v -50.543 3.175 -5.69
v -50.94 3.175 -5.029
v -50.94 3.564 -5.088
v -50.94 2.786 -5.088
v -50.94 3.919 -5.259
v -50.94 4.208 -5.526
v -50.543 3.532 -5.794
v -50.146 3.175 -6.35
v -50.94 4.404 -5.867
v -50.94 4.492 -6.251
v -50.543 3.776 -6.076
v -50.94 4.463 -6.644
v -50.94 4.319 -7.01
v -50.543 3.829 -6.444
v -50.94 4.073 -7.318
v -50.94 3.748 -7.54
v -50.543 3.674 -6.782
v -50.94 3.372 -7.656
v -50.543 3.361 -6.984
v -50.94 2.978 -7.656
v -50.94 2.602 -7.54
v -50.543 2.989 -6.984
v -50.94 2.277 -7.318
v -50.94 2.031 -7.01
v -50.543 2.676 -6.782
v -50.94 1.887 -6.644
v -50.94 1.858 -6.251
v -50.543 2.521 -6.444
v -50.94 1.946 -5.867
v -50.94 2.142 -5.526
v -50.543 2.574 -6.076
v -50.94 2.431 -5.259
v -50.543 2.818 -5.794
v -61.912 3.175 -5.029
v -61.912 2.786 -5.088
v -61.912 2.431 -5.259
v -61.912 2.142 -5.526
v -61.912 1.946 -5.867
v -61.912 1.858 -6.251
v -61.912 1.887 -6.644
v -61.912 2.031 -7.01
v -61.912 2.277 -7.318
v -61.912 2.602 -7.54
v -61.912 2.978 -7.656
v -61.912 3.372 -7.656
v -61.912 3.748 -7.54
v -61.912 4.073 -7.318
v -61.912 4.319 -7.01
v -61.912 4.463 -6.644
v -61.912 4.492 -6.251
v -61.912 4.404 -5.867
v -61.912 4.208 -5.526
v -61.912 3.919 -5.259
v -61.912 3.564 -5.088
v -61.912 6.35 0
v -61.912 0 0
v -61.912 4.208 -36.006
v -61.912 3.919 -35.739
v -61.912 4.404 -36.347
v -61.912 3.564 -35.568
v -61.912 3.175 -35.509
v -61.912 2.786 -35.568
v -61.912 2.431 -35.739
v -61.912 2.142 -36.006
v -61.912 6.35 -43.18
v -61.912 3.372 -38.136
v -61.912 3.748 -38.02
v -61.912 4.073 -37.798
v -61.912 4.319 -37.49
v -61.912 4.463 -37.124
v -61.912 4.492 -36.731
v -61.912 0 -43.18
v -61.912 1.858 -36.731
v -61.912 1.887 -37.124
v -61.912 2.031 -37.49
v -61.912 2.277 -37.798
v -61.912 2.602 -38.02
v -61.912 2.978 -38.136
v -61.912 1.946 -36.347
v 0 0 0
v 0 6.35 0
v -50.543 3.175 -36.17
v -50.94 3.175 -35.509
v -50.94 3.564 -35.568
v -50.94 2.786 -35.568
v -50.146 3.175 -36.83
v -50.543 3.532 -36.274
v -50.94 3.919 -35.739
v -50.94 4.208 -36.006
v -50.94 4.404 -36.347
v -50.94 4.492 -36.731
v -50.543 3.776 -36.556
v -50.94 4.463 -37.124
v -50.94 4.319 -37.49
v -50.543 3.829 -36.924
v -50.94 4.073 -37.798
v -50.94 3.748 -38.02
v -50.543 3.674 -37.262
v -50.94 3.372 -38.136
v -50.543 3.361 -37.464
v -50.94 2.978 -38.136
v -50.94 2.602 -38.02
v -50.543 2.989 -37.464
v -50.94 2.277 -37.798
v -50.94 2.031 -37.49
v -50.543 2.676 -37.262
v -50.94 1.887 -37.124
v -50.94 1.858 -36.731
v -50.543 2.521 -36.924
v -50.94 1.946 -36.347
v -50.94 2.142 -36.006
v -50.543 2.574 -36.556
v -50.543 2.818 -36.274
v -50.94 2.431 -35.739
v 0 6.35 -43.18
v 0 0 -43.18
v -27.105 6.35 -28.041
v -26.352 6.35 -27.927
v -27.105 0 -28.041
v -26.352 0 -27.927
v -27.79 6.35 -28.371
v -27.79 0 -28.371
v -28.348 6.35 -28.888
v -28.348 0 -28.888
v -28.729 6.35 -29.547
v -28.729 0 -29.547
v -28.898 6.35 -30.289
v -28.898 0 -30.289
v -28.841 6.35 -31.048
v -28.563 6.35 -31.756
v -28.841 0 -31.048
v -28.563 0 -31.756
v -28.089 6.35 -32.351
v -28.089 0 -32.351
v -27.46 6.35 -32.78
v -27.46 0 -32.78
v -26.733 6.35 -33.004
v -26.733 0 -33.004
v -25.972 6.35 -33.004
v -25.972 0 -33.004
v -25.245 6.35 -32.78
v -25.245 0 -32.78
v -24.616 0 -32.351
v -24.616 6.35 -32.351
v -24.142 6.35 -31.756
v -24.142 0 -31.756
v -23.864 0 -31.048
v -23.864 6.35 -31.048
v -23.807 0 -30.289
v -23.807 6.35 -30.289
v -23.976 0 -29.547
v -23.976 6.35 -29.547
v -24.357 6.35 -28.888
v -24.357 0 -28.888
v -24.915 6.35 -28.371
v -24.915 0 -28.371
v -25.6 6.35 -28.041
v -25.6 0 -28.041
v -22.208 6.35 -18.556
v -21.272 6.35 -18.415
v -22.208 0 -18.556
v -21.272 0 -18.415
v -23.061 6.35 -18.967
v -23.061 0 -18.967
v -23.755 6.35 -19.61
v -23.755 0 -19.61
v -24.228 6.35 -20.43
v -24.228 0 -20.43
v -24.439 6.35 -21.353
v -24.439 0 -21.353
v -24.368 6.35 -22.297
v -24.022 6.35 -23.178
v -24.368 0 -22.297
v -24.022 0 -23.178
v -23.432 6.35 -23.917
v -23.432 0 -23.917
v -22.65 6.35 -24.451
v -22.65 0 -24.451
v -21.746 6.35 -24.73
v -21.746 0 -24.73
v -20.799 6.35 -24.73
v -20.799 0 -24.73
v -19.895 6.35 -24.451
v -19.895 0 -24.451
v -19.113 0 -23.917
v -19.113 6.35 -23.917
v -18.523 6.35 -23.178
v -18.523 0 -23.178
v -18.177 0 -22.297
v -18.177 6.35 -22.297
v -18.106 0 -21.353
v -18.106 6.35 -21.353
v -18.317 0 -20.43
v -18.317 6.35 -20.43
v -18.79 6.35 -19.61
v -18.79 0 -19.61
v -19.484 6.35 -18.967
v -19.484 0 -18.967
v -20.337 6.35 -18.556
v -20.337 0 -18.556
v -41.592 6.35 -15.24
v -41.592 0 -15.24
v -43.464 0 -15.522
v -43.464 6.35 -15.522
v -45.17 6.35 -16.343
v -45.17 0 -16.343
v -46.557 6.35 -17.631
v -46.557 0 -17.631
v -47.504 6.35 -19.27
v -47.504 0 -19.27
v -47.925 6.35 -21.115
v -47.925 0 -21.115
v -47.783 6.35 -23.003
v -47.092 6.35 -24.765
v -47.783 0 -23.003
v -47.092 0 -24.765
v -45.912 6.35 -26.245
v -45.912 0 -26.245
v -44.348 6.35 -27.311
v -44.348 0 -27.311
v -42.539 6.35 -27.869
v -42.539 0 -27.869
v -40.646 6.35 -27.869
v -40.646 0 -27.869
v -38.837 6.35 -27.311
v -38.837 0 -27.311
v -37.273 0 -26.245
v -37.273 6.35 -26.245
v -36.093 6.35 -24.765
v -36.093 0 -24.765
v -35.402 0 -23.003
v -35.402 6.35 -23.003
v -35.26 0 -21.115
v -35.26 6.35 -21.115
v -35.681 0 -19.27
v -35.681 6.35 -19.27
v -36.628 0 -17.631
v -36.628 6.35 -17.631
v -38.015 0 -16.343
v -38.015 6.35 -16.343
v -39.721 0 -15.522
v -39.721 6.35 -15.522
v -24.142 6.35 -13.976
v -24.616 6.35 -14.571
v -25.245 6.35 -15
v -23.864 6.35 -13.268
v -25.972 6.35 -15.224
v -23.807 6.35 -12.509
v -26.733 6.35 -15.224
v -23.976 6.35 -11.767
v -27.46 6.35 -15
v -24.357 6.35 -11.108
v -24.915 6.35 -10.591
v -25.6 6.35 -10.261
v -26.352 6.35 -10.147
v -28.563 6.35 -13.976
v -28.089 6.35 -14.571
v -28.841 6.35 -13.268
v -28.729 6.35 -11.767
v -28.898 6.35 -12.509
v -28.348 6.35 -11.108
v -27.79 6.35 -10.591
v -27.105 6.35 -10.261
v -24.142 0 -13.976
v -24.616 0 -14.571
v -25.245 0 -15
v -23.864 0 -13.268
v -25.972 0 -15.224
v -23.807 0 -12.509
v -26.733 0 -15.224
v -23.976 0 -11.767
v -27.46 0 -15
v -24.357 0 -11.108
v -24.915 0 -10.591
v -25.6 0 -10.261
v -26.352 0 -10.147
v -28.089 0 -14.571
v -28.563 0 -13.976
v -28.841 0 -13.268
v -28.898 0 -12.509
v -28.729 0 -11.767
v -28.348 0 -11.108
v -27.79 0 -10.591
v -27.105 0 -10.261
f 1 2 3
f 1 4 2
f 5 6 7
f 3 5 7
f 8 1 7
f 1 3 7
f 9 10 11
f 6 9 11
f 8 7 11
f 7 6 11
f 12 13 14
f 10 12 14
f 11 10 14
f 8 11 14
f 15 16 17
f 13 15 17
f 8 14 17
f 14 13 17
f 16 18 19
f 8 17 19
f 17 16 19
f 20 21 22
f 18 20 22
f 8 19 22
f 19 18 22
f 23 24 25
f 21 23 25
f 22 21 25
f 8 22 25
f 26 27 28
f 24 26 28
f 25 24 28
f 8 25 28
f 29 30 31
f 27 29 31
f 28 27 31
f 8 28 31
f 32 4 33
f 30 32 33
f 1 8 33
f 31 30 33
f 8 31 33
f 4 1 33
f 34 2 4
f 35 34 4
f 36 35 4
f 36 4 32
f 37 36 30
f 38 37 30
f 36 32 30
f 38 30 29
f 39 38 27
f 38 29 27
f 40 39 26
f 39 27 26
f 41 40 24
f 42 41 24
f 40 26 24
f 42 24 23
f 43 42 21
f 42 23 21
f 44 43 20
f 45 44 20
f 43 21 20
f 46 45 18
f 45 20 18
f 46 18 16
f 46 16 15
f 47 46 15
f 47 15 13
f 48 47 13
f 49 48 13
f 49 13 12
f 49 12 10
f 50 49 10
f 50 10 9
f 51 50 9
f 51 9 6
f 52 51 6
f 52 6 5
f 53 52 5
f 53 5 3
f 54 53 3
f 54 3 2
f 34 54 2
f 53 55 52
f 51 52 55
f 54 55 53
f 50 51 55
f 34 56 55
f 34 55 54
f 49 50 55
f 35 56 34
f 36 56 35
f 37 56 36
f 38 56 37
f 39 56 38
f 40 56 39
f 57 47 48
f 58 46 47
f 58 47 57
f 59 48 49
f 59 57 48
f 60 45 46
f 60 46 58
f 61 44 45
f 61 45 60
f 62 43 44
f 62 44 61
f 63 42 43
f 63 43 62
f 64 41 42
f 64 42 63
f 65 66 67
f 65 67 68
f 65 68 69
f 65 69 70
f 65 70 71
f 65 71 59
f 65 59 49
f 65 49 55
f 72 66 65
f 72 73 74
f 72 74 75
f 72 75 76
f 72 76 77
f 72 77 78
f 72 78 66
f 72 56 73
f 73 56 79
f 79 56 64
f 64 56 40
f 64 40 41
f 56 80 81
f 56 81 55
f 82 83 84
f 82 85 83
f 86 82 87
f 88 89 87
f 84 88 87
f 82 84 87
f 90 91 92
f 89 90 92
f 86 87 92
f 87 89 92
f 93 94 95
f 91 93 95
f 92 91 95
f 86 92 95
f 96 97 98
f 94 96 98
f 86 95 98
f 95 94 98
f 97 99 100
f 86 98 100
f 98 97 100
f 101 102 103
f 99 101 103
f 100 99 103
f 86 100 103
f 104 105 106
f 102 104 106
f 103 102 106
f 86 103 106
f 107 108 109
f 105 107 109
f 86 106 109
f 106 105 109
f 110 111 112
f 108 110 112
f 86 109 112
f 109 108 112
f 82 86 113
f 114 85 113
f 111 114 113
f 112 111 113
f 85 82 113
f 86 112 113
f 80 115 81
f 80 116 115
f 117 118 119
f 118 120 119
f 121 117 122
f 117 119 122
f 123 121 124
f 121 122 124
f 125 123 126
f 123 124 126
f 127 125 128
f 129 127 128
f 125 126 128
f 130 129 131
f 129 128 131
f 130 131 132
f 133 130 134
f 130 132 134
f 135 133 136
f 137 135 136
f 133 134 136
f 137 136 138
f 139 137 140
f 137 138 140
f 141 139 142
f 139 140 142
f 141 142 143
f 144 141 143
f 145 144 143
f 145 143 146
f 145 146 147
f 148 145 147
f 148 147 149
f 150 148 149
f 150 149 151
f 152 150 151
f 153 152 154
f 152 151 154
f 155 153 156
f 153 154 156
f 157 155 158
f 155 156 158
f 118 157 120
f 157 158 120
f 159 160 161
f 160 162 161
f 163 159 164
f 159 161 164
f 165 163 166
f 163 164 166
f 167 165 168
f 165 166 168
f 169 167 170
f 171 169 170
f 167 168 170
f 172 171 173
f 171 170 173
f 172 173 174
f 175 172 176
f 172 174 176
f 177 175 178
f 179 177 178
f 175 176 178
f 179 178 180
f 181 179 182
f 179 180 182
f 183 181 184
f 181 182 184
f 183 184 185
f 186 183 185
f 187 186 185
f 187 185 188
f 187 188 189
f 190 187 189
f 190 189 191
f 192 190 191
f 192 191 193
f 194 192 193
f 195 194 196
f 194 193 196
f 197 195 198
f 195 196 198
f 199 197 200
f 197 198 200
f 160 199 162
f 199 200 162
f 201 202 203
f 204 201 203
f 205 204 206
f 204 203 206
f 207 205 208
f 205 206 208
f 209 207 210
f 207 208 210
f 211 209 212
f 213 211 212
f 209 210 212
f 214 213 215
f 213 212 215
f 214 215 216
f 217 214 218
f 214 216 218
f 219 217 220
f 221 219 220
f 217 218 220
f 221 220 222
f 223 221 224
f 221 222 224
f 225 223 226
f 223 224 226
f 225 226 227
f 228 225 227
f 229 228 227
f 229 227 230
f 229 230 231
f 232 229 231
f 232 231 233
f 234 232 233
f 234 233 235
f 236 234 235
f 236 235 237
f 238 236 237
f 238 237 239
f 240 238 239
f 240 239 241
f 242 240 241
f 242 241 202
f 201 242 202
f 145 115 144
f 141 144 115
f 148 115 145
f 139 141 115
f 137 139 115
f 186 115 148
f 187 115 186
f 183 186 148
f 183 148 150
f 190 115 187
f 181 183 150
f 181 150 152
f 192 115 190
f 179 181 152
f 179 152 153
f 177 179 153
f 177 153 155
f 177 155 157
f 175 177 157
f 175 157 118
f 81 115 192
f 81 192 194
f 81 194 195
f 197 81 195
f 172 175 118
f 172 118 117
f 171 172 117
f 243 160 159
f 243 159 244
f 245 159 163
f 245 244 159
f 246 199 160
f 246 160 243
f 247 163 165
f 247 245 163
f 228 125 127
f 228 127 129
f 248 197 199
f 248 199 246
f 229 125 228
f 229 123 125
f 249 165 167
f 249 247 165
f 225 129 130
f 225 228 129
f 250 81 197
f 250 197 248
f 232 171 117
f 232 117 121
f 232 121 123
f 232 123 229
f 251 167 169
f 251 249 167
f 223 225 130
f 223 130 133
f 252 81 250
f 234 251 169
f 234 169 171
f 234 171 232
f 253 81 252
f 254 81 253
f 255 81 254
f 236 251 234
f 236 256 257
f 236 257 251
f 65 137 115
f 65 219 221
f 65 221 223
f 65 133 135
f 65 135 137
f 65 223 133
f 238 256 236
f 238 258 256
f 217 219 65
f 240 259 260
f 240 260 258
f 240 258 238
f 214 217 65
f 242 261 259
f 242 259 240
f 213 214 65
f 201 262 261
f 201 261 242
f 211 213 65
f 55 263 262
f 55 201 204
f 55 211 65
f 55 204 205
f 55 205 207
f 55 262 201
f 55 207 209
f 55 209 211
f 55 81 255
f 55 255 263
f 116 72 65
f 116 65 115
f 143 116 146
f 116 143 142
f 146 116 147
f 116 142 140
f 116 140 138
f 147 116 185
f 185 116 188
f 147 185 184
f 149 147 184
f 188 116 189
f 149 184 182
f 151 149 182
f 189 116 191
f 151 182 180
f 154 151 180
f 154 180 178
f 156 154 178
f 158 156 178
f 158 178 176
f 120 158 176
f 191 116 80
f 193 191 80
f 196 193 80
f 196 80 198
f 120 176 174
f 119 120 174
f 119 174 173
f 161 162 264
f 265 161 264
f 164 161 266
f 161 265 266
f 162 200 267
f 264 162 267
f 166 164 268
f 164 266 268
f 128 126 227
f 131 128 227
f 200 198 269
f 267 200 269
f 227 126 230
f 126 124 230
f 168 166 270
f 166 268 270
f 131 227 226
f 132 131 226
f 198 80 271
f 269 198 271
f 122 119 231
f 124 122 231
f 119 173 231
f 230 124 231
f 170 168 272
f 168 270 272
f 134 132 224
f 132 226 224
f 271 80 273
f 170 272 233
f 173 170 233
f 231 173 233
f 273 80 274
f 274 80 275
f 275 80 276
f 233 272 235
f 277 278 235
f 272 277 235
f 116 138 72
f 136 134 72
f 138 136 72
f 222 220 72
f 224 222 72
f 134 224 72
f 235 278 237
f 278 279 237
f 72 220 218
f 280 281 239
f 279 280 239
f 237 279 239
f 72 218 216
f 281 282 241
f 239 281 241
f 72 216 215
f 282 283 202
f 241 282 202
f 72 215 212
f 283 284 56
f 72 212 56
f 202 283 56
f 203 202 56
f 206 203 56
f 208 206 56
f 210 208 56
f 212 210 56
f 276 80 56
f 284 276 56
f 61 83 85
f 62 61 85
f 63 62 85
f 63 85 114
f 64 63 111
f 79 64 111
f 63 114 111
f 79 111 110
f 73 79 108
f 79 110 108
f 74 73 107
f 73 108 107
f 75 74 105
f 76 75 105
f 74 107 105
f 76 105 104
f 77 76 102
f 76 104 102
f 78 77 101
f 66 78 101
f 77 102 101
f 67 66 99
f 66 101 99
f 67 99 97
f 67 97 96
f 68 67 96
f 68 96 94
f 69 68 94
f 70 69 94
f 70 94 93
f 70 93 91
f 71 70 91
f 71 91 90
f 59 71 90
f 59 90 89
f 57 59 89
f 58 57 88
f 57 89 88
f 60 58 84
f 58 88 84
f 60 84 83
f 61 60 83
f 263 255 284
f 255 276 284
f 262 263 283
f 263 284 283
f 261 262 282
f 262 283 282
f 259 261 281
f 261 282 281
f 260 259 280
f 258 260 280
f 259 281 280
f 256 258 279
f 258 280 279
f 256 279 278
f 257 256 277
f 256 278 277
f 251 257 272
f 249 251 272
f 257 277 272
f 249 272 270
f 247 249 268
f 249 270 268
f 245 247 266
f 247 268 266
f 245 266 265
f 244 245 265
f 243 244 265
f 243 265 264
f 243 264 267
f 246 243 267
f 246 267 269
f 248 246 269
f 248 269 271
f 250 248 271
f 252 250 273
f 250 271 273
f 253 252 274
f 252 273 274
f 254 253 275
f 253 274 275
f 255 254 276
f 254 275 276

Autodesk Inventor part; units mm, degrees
ref_plane "YZ Plane" through (0, 0, 0) normal (1, 0, 0) x (0, 1, 0)
ref_plane "XZ Plane" through (0, 0, 0) normal (0, 1, 0) x (-1, 0, 0)
ref_plane "XY Plane" through (0, 0, 0) normal (0, 0, 1) x (1, 0, 0)
sketch "Sketch1" plane through (0, 0, 0) normal (0, 1, 0) x (-1, 0, 0)
  line L0 (0, 0) -> (61.9125, 0)
  line L1 (61.9125, 0) -> (61.9125, -43.18)
  line L2 (61.9125, -43.18) -> (0, -43.18)
  line L3 (0, -43.18) -> (0, 0)
  dimension "d0" = 61.9125
  dimension "d1" = 43.18
extrude "Extrusion1" add sketch "Sketch1" along normal blind 6.35
sketch "Sketch2" plane through (0, 6.35, 0) normal (0, 1, 0) x (1, 0, 0)
  line L0 (-61.9125, 43.18) -> (-61.9125, 0)
  line L1 (-61.9125, 0) -> (0, 0)
  line L2 (0, 0) -> (0, 43.18)
  line L3 (-61.9125, 43.18) -> (0, 43.18)
  line L4 (-61.9125, 43.18) -> (-61.9125, 0) projected
  line L5 (0, 43.18) -> (-61.9125, 43.18) projected
  line L6 (-61.9125, 0) -> (0, 0) projected
  line L7 (0, 0) -> (0, 43.18) projected
  point P0 (-41.5925, 21.59)
  point P1 (-21.2725, 21.59)
  point P2 (-26.3525, 30.48)
  point P3 (-26.3525, 12.7)
  dimension "d10" = 21.2725
  dimension "d11" = 21.59
  dimension "d14" = 21.59
  dimension "d15" = 20.32
  dimension "d18" = 12.7
  dimension "d19" = 12.7
  dimension "d20" = 15.24
  dimension "d21" = 15.24
hole "Hole1" at (-21.2725, 6.35, -21.59) direction (0, -1, 0) diameter 6.35 depth 10.9728 tip angle 118
hole "Hole2" at (-41.5925, 6.35, -21.59) direction (0, -1, 0) diameter 12.7 end through all
hole "Hole3" at (-26.3525, 6.35, -30.48) at (-26.3525, 6.35, -12.7) direction (0, -1, 0) diameter 5.1054 end through all clearance for "Flat Head Machine Screw (82)" size "#10" standard "Ansi Unified Screw Threads"
sketch "Sketch3" plane through (-61.9125, 0, -43.18) normal (-1, 0, 0) x (0, 0, 1)
  line L0 (43.18, 0) -> (43.18, 6.35) projected
  line L1 (0, 0) -> (0, 6.35) projected
  line L2 (0, 0) -> (43.18, 0) projected
  point P0 (6.35, 3.175)
  point P1 (36.83, 3.175)
  dimension "d50" = 6.35
  dimension "d51" = 6.35
  dimension "d52" = 3.175
hole "Hole4" at (-61.9125, 3.175, -36.83) at (-61.9125, 3.175, -6.35) direction (1, 0, 0) diameter 2.6416 depth 10.9728 tip angle 118 thread size "6-32 UNC" class "3B" standard "ANSI Unified Screw Threads"
properties part number "AR-BracketRight2"
